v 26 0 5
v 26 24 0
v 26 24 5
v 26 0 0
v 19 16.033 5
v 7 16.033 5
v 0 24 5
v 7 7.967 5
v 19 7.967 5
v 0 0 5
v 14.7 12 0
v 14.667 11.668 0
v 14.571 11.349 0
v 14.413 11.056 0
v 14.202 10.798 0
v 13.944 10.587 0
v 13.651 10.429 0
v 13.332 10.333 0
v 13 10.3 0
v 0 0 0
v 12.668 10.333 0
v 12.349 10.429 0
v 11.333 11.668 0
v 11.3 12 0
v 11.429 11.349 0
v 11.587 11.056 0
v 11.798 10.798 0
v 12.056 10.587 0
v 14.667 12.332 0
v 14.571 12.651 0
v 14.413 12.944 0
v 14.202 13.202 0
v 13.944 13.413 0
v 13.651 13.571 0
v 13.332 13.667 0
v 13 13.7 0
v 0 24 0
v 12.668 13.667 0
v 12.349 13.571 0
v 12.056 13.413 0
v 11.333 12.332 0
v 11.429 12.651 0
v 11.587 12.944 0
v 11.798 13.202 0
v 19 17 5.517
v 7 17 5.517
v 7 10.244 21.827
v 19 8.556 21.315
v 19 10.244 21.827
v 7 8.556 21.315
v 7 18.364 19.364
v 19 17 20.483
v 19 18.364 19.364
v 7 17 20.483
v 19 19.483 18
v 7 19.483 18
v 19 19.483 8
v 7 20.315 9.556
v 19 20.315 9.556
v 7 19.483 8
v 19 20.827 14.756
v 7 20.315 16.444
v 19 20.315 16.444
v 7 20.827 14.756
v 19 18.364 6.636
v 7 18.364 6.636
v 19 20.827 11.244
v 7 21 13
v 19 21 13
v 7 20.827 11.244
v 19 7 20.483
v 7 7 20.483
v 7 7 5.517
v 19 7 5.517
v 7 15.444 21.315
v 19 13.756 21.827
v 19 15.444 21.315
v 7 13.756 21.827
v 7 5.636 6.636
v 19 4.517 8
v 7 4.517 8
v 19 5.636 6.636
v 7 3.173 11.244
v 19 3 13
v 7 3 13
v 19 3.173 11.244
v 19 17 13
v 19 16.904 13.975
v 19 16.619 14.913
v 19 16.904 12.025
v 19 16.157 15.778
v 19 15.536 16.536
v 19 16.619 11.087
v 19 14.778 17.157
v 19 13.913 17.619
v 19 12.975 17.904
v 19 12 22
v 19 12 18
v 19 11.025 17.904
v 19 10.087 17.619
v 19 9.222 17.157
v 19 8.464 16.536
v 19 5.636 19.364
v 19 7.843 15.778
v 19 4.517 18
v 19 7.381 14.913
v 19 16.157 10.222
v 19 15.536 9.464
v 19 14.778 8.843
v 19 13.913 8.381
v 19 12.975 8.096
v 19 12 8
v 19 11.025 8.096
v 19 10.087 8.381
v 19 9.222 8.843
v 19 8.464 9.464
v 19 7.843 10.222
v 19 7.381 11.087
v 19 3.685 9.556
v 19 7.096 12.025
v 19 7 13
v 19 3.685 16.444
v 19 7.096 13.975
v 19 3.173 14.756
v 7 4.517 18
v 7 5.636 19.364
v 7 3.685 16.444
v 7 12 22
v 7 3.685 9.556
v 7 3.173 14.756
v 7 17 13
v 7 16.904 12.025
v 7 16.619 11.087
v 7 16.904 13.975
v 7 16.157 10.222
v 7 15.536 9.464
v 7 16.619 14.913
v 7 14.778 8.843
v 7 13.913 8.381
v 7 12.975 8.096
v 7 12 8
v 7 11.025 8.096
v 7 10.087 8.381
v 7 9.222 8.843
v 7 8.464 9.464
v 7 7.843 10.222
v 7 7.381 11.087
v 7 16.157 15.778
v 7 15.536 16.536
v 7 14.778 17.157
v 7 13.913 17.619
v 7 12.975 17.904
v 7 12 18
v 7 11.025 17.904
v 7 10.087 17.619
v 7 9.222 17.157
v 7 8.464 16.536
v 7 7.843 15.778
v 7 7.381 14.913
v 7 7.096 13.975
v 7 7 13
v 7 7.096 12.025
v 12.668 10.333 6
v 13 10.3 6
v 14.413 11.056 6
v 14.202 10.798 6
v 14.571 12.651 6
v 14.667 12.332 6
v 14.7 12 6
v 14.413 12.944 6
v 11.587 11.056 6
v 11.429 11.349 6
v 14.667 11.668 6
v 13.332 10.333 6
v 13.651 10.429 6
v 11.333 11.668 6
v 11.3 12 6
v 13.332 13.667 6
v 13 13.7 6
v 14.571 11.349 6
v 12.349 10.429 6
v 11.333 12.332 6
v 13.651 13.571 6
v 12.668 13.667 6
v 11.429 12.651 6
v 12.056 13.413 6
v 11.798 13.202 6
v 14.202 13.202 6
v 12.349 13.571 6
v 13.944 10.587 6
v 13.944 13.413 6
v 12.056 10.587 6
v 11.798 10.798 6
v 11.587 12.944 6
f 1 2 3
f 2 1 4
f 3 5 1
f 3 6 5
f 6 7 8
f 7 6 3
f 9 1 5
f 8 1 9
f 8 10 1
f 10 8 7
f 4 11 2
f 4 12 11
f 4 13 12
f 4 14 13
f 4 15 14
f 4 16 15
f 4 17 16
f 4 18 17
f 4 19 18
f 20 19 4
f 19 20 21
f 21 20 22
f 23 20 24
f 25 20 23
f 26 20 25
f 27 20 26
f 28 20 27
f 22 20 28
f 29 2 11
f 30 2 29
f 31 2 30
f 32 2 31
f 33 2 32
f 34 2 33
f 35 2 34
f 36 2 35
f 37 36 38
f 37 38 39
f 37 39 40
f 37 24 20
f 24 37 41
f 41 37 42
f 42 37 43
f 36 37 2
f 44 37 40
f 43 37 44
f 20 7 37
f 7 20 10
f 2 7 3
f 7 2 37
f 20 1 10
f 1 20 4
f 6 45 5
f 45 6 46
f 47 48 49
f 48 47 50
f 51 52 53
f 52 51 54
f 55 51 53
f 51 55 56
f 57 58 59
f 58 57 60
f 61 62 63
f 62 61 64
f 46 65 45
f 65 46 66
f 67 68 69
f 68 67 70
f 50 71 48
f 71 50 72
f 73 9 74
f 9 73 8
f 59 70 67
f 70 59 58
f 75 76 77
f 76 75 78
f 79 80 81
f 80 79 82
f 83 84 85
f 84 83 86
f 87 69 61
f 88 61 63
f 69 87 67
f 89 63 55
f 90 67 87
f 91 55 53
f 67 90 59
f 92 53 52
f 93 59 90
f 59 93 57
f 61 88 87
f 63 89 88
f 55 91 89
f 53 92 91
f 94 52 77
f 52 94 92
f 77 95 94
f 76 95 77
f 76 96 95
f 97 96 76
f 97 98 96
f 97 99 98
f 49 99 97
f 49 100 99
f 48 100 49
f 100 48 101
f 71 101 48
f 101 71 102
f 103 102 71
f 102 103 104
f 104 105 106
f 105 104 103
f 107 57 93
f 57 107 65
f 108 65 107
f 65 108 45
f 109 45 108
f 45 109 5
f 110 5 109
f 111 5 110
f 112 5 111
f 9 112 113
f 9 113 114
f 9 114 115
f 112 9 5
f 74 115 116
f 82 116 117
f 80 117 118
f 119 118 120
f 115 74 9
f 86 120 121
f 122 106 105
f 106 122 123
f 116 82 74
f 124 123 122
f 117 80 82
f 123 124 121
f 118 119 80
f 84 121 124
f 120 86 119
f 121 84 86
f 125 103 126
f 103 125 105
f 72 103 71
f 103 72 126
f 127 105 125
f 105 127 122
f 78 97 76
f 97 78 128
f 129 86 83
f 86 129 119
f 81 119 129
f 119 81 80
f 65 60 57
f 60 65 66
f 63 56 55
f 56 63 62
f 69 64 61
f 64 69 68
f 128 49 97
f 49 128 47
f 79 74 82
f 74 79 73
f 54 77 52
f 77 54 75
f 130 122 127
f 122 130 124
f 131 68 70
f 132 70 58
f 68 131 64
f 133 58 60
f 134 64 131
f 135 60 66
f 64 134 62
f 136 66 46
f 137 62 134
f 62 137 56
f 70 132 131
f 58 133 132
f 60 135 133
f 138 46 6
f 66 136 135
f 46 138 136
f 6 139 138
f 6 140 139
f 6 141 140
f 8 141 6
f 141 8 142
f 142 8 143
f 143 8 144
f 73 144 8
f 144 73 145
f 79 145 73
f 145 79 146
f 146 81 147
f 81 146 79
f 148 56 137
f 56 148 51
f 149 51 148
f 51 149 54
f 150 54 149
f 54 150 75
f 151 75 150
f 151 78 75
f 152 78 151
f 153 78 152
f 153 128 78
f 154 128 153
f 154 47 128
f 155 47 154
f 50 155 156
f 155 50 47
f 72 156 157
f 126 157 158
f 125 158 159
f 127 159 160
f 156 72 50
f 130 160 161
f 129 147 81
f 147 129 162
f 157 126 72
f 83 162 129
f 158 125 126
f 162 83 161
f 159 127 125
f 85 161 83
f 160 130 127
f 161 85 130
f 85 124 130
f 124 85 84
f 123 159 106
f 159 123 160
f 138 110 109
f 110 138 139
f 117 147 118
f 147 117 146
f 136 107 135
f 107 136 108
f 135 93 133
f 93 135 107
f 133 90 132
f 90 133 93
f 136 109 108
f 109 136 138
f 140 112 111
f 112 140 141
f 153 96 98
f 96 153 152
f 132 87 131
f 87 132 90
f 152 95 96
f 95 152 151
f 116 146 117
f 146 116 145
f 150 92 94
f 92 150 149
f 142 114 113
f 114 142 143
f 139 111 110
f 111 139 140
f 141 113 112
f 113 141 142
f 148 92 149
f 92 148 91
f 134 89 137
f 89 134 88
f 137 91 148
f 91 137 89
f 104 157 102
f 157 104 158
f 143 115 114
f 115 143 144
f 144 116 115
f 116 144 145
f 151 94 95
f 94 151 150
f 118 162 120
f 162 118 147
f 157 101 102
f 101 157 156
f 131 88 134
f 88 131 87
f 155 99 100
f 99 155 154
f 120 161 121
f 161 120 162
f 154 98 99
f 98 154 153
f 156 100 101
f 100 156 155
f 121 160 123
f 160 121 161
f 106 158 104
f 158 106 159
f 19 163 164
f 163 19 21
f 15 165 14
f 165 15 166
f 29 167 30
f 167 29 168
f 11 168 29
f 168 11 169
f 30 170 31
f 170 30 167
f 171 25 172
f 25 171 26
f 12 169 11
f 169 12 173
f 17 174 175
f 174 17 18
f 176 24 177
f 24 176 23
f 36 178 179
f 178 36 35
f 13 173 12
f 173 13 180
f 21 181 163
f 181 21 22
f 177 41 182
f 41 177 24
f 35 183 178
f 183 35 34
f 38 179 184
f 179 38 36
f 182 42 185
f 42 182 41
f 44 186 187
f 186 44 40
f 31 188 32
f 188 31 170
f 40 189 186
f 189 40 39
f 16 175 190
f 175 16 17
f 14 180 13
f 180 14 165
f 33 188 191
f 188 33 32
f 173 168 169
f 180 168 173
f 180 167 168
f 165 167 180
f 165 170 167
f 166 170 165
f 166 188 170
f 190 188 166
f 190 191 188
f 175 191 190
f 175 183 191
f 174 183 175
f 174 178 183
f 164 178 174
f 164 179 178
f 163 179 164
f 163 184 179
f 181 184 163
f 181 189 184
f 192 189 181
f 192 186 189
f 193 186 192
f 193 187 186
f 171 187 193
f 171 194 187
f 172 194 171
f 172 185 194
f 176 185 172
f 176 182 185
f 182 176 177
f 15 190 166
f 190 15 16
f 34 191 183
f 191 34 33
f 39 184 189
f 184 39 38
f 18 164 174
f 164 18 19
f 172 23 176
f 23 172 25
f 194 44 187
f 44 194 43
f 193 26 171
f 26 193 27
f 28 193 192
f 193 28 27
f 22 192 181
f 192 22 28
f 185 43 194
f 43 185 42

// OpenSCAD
$fn = 32;

// ----------------------------------------------------------------------
// Cable clip: cable 10 mm, clamp 18 mm, base 26 mm
// ----------------------------------------------------------------------

// --- parameters (mm) ---
plate_x = 26;             // base length, X
plate_y = 24;             // base width, Y
plate_t = 5;              // base thickness
wire_seat_d = 18;         // clamp outside diameter
clip_t = 4;               // clamp wall
cable_d = 10;             // cable opening
ring_w = 12;              // clamp width along the cable
screw_d = 3.4;            // screw clearance
sink = 1;                 // overlap of the clamp into the base

module base() {
  cube([plate_x, plate_y, plate_t]);
}

module clamp() {
  translate([plate_x / 2, plate_y / 2, plate_t + wire_seat_d / 2 - sink]) rotate([0, 90, 0])
    cylinder(h = ring_w, d = wire_seat_d, center = true);
}

difference() {
  union() {
    base();
    clamp();
  }
  translate([plate_x / 2, plate_y / 2, plate_t + wire_seat_d / 2 - sink]) rotate([0, 90, 0]) translate([0, 0, -ring_w / 2 - 1]) cylinder(h = ring_w + 2, d = cable_d);
  translate([13, plate_y / 2, -1]) cylinder(h = plate_t + 2, d = screw_d);
}
